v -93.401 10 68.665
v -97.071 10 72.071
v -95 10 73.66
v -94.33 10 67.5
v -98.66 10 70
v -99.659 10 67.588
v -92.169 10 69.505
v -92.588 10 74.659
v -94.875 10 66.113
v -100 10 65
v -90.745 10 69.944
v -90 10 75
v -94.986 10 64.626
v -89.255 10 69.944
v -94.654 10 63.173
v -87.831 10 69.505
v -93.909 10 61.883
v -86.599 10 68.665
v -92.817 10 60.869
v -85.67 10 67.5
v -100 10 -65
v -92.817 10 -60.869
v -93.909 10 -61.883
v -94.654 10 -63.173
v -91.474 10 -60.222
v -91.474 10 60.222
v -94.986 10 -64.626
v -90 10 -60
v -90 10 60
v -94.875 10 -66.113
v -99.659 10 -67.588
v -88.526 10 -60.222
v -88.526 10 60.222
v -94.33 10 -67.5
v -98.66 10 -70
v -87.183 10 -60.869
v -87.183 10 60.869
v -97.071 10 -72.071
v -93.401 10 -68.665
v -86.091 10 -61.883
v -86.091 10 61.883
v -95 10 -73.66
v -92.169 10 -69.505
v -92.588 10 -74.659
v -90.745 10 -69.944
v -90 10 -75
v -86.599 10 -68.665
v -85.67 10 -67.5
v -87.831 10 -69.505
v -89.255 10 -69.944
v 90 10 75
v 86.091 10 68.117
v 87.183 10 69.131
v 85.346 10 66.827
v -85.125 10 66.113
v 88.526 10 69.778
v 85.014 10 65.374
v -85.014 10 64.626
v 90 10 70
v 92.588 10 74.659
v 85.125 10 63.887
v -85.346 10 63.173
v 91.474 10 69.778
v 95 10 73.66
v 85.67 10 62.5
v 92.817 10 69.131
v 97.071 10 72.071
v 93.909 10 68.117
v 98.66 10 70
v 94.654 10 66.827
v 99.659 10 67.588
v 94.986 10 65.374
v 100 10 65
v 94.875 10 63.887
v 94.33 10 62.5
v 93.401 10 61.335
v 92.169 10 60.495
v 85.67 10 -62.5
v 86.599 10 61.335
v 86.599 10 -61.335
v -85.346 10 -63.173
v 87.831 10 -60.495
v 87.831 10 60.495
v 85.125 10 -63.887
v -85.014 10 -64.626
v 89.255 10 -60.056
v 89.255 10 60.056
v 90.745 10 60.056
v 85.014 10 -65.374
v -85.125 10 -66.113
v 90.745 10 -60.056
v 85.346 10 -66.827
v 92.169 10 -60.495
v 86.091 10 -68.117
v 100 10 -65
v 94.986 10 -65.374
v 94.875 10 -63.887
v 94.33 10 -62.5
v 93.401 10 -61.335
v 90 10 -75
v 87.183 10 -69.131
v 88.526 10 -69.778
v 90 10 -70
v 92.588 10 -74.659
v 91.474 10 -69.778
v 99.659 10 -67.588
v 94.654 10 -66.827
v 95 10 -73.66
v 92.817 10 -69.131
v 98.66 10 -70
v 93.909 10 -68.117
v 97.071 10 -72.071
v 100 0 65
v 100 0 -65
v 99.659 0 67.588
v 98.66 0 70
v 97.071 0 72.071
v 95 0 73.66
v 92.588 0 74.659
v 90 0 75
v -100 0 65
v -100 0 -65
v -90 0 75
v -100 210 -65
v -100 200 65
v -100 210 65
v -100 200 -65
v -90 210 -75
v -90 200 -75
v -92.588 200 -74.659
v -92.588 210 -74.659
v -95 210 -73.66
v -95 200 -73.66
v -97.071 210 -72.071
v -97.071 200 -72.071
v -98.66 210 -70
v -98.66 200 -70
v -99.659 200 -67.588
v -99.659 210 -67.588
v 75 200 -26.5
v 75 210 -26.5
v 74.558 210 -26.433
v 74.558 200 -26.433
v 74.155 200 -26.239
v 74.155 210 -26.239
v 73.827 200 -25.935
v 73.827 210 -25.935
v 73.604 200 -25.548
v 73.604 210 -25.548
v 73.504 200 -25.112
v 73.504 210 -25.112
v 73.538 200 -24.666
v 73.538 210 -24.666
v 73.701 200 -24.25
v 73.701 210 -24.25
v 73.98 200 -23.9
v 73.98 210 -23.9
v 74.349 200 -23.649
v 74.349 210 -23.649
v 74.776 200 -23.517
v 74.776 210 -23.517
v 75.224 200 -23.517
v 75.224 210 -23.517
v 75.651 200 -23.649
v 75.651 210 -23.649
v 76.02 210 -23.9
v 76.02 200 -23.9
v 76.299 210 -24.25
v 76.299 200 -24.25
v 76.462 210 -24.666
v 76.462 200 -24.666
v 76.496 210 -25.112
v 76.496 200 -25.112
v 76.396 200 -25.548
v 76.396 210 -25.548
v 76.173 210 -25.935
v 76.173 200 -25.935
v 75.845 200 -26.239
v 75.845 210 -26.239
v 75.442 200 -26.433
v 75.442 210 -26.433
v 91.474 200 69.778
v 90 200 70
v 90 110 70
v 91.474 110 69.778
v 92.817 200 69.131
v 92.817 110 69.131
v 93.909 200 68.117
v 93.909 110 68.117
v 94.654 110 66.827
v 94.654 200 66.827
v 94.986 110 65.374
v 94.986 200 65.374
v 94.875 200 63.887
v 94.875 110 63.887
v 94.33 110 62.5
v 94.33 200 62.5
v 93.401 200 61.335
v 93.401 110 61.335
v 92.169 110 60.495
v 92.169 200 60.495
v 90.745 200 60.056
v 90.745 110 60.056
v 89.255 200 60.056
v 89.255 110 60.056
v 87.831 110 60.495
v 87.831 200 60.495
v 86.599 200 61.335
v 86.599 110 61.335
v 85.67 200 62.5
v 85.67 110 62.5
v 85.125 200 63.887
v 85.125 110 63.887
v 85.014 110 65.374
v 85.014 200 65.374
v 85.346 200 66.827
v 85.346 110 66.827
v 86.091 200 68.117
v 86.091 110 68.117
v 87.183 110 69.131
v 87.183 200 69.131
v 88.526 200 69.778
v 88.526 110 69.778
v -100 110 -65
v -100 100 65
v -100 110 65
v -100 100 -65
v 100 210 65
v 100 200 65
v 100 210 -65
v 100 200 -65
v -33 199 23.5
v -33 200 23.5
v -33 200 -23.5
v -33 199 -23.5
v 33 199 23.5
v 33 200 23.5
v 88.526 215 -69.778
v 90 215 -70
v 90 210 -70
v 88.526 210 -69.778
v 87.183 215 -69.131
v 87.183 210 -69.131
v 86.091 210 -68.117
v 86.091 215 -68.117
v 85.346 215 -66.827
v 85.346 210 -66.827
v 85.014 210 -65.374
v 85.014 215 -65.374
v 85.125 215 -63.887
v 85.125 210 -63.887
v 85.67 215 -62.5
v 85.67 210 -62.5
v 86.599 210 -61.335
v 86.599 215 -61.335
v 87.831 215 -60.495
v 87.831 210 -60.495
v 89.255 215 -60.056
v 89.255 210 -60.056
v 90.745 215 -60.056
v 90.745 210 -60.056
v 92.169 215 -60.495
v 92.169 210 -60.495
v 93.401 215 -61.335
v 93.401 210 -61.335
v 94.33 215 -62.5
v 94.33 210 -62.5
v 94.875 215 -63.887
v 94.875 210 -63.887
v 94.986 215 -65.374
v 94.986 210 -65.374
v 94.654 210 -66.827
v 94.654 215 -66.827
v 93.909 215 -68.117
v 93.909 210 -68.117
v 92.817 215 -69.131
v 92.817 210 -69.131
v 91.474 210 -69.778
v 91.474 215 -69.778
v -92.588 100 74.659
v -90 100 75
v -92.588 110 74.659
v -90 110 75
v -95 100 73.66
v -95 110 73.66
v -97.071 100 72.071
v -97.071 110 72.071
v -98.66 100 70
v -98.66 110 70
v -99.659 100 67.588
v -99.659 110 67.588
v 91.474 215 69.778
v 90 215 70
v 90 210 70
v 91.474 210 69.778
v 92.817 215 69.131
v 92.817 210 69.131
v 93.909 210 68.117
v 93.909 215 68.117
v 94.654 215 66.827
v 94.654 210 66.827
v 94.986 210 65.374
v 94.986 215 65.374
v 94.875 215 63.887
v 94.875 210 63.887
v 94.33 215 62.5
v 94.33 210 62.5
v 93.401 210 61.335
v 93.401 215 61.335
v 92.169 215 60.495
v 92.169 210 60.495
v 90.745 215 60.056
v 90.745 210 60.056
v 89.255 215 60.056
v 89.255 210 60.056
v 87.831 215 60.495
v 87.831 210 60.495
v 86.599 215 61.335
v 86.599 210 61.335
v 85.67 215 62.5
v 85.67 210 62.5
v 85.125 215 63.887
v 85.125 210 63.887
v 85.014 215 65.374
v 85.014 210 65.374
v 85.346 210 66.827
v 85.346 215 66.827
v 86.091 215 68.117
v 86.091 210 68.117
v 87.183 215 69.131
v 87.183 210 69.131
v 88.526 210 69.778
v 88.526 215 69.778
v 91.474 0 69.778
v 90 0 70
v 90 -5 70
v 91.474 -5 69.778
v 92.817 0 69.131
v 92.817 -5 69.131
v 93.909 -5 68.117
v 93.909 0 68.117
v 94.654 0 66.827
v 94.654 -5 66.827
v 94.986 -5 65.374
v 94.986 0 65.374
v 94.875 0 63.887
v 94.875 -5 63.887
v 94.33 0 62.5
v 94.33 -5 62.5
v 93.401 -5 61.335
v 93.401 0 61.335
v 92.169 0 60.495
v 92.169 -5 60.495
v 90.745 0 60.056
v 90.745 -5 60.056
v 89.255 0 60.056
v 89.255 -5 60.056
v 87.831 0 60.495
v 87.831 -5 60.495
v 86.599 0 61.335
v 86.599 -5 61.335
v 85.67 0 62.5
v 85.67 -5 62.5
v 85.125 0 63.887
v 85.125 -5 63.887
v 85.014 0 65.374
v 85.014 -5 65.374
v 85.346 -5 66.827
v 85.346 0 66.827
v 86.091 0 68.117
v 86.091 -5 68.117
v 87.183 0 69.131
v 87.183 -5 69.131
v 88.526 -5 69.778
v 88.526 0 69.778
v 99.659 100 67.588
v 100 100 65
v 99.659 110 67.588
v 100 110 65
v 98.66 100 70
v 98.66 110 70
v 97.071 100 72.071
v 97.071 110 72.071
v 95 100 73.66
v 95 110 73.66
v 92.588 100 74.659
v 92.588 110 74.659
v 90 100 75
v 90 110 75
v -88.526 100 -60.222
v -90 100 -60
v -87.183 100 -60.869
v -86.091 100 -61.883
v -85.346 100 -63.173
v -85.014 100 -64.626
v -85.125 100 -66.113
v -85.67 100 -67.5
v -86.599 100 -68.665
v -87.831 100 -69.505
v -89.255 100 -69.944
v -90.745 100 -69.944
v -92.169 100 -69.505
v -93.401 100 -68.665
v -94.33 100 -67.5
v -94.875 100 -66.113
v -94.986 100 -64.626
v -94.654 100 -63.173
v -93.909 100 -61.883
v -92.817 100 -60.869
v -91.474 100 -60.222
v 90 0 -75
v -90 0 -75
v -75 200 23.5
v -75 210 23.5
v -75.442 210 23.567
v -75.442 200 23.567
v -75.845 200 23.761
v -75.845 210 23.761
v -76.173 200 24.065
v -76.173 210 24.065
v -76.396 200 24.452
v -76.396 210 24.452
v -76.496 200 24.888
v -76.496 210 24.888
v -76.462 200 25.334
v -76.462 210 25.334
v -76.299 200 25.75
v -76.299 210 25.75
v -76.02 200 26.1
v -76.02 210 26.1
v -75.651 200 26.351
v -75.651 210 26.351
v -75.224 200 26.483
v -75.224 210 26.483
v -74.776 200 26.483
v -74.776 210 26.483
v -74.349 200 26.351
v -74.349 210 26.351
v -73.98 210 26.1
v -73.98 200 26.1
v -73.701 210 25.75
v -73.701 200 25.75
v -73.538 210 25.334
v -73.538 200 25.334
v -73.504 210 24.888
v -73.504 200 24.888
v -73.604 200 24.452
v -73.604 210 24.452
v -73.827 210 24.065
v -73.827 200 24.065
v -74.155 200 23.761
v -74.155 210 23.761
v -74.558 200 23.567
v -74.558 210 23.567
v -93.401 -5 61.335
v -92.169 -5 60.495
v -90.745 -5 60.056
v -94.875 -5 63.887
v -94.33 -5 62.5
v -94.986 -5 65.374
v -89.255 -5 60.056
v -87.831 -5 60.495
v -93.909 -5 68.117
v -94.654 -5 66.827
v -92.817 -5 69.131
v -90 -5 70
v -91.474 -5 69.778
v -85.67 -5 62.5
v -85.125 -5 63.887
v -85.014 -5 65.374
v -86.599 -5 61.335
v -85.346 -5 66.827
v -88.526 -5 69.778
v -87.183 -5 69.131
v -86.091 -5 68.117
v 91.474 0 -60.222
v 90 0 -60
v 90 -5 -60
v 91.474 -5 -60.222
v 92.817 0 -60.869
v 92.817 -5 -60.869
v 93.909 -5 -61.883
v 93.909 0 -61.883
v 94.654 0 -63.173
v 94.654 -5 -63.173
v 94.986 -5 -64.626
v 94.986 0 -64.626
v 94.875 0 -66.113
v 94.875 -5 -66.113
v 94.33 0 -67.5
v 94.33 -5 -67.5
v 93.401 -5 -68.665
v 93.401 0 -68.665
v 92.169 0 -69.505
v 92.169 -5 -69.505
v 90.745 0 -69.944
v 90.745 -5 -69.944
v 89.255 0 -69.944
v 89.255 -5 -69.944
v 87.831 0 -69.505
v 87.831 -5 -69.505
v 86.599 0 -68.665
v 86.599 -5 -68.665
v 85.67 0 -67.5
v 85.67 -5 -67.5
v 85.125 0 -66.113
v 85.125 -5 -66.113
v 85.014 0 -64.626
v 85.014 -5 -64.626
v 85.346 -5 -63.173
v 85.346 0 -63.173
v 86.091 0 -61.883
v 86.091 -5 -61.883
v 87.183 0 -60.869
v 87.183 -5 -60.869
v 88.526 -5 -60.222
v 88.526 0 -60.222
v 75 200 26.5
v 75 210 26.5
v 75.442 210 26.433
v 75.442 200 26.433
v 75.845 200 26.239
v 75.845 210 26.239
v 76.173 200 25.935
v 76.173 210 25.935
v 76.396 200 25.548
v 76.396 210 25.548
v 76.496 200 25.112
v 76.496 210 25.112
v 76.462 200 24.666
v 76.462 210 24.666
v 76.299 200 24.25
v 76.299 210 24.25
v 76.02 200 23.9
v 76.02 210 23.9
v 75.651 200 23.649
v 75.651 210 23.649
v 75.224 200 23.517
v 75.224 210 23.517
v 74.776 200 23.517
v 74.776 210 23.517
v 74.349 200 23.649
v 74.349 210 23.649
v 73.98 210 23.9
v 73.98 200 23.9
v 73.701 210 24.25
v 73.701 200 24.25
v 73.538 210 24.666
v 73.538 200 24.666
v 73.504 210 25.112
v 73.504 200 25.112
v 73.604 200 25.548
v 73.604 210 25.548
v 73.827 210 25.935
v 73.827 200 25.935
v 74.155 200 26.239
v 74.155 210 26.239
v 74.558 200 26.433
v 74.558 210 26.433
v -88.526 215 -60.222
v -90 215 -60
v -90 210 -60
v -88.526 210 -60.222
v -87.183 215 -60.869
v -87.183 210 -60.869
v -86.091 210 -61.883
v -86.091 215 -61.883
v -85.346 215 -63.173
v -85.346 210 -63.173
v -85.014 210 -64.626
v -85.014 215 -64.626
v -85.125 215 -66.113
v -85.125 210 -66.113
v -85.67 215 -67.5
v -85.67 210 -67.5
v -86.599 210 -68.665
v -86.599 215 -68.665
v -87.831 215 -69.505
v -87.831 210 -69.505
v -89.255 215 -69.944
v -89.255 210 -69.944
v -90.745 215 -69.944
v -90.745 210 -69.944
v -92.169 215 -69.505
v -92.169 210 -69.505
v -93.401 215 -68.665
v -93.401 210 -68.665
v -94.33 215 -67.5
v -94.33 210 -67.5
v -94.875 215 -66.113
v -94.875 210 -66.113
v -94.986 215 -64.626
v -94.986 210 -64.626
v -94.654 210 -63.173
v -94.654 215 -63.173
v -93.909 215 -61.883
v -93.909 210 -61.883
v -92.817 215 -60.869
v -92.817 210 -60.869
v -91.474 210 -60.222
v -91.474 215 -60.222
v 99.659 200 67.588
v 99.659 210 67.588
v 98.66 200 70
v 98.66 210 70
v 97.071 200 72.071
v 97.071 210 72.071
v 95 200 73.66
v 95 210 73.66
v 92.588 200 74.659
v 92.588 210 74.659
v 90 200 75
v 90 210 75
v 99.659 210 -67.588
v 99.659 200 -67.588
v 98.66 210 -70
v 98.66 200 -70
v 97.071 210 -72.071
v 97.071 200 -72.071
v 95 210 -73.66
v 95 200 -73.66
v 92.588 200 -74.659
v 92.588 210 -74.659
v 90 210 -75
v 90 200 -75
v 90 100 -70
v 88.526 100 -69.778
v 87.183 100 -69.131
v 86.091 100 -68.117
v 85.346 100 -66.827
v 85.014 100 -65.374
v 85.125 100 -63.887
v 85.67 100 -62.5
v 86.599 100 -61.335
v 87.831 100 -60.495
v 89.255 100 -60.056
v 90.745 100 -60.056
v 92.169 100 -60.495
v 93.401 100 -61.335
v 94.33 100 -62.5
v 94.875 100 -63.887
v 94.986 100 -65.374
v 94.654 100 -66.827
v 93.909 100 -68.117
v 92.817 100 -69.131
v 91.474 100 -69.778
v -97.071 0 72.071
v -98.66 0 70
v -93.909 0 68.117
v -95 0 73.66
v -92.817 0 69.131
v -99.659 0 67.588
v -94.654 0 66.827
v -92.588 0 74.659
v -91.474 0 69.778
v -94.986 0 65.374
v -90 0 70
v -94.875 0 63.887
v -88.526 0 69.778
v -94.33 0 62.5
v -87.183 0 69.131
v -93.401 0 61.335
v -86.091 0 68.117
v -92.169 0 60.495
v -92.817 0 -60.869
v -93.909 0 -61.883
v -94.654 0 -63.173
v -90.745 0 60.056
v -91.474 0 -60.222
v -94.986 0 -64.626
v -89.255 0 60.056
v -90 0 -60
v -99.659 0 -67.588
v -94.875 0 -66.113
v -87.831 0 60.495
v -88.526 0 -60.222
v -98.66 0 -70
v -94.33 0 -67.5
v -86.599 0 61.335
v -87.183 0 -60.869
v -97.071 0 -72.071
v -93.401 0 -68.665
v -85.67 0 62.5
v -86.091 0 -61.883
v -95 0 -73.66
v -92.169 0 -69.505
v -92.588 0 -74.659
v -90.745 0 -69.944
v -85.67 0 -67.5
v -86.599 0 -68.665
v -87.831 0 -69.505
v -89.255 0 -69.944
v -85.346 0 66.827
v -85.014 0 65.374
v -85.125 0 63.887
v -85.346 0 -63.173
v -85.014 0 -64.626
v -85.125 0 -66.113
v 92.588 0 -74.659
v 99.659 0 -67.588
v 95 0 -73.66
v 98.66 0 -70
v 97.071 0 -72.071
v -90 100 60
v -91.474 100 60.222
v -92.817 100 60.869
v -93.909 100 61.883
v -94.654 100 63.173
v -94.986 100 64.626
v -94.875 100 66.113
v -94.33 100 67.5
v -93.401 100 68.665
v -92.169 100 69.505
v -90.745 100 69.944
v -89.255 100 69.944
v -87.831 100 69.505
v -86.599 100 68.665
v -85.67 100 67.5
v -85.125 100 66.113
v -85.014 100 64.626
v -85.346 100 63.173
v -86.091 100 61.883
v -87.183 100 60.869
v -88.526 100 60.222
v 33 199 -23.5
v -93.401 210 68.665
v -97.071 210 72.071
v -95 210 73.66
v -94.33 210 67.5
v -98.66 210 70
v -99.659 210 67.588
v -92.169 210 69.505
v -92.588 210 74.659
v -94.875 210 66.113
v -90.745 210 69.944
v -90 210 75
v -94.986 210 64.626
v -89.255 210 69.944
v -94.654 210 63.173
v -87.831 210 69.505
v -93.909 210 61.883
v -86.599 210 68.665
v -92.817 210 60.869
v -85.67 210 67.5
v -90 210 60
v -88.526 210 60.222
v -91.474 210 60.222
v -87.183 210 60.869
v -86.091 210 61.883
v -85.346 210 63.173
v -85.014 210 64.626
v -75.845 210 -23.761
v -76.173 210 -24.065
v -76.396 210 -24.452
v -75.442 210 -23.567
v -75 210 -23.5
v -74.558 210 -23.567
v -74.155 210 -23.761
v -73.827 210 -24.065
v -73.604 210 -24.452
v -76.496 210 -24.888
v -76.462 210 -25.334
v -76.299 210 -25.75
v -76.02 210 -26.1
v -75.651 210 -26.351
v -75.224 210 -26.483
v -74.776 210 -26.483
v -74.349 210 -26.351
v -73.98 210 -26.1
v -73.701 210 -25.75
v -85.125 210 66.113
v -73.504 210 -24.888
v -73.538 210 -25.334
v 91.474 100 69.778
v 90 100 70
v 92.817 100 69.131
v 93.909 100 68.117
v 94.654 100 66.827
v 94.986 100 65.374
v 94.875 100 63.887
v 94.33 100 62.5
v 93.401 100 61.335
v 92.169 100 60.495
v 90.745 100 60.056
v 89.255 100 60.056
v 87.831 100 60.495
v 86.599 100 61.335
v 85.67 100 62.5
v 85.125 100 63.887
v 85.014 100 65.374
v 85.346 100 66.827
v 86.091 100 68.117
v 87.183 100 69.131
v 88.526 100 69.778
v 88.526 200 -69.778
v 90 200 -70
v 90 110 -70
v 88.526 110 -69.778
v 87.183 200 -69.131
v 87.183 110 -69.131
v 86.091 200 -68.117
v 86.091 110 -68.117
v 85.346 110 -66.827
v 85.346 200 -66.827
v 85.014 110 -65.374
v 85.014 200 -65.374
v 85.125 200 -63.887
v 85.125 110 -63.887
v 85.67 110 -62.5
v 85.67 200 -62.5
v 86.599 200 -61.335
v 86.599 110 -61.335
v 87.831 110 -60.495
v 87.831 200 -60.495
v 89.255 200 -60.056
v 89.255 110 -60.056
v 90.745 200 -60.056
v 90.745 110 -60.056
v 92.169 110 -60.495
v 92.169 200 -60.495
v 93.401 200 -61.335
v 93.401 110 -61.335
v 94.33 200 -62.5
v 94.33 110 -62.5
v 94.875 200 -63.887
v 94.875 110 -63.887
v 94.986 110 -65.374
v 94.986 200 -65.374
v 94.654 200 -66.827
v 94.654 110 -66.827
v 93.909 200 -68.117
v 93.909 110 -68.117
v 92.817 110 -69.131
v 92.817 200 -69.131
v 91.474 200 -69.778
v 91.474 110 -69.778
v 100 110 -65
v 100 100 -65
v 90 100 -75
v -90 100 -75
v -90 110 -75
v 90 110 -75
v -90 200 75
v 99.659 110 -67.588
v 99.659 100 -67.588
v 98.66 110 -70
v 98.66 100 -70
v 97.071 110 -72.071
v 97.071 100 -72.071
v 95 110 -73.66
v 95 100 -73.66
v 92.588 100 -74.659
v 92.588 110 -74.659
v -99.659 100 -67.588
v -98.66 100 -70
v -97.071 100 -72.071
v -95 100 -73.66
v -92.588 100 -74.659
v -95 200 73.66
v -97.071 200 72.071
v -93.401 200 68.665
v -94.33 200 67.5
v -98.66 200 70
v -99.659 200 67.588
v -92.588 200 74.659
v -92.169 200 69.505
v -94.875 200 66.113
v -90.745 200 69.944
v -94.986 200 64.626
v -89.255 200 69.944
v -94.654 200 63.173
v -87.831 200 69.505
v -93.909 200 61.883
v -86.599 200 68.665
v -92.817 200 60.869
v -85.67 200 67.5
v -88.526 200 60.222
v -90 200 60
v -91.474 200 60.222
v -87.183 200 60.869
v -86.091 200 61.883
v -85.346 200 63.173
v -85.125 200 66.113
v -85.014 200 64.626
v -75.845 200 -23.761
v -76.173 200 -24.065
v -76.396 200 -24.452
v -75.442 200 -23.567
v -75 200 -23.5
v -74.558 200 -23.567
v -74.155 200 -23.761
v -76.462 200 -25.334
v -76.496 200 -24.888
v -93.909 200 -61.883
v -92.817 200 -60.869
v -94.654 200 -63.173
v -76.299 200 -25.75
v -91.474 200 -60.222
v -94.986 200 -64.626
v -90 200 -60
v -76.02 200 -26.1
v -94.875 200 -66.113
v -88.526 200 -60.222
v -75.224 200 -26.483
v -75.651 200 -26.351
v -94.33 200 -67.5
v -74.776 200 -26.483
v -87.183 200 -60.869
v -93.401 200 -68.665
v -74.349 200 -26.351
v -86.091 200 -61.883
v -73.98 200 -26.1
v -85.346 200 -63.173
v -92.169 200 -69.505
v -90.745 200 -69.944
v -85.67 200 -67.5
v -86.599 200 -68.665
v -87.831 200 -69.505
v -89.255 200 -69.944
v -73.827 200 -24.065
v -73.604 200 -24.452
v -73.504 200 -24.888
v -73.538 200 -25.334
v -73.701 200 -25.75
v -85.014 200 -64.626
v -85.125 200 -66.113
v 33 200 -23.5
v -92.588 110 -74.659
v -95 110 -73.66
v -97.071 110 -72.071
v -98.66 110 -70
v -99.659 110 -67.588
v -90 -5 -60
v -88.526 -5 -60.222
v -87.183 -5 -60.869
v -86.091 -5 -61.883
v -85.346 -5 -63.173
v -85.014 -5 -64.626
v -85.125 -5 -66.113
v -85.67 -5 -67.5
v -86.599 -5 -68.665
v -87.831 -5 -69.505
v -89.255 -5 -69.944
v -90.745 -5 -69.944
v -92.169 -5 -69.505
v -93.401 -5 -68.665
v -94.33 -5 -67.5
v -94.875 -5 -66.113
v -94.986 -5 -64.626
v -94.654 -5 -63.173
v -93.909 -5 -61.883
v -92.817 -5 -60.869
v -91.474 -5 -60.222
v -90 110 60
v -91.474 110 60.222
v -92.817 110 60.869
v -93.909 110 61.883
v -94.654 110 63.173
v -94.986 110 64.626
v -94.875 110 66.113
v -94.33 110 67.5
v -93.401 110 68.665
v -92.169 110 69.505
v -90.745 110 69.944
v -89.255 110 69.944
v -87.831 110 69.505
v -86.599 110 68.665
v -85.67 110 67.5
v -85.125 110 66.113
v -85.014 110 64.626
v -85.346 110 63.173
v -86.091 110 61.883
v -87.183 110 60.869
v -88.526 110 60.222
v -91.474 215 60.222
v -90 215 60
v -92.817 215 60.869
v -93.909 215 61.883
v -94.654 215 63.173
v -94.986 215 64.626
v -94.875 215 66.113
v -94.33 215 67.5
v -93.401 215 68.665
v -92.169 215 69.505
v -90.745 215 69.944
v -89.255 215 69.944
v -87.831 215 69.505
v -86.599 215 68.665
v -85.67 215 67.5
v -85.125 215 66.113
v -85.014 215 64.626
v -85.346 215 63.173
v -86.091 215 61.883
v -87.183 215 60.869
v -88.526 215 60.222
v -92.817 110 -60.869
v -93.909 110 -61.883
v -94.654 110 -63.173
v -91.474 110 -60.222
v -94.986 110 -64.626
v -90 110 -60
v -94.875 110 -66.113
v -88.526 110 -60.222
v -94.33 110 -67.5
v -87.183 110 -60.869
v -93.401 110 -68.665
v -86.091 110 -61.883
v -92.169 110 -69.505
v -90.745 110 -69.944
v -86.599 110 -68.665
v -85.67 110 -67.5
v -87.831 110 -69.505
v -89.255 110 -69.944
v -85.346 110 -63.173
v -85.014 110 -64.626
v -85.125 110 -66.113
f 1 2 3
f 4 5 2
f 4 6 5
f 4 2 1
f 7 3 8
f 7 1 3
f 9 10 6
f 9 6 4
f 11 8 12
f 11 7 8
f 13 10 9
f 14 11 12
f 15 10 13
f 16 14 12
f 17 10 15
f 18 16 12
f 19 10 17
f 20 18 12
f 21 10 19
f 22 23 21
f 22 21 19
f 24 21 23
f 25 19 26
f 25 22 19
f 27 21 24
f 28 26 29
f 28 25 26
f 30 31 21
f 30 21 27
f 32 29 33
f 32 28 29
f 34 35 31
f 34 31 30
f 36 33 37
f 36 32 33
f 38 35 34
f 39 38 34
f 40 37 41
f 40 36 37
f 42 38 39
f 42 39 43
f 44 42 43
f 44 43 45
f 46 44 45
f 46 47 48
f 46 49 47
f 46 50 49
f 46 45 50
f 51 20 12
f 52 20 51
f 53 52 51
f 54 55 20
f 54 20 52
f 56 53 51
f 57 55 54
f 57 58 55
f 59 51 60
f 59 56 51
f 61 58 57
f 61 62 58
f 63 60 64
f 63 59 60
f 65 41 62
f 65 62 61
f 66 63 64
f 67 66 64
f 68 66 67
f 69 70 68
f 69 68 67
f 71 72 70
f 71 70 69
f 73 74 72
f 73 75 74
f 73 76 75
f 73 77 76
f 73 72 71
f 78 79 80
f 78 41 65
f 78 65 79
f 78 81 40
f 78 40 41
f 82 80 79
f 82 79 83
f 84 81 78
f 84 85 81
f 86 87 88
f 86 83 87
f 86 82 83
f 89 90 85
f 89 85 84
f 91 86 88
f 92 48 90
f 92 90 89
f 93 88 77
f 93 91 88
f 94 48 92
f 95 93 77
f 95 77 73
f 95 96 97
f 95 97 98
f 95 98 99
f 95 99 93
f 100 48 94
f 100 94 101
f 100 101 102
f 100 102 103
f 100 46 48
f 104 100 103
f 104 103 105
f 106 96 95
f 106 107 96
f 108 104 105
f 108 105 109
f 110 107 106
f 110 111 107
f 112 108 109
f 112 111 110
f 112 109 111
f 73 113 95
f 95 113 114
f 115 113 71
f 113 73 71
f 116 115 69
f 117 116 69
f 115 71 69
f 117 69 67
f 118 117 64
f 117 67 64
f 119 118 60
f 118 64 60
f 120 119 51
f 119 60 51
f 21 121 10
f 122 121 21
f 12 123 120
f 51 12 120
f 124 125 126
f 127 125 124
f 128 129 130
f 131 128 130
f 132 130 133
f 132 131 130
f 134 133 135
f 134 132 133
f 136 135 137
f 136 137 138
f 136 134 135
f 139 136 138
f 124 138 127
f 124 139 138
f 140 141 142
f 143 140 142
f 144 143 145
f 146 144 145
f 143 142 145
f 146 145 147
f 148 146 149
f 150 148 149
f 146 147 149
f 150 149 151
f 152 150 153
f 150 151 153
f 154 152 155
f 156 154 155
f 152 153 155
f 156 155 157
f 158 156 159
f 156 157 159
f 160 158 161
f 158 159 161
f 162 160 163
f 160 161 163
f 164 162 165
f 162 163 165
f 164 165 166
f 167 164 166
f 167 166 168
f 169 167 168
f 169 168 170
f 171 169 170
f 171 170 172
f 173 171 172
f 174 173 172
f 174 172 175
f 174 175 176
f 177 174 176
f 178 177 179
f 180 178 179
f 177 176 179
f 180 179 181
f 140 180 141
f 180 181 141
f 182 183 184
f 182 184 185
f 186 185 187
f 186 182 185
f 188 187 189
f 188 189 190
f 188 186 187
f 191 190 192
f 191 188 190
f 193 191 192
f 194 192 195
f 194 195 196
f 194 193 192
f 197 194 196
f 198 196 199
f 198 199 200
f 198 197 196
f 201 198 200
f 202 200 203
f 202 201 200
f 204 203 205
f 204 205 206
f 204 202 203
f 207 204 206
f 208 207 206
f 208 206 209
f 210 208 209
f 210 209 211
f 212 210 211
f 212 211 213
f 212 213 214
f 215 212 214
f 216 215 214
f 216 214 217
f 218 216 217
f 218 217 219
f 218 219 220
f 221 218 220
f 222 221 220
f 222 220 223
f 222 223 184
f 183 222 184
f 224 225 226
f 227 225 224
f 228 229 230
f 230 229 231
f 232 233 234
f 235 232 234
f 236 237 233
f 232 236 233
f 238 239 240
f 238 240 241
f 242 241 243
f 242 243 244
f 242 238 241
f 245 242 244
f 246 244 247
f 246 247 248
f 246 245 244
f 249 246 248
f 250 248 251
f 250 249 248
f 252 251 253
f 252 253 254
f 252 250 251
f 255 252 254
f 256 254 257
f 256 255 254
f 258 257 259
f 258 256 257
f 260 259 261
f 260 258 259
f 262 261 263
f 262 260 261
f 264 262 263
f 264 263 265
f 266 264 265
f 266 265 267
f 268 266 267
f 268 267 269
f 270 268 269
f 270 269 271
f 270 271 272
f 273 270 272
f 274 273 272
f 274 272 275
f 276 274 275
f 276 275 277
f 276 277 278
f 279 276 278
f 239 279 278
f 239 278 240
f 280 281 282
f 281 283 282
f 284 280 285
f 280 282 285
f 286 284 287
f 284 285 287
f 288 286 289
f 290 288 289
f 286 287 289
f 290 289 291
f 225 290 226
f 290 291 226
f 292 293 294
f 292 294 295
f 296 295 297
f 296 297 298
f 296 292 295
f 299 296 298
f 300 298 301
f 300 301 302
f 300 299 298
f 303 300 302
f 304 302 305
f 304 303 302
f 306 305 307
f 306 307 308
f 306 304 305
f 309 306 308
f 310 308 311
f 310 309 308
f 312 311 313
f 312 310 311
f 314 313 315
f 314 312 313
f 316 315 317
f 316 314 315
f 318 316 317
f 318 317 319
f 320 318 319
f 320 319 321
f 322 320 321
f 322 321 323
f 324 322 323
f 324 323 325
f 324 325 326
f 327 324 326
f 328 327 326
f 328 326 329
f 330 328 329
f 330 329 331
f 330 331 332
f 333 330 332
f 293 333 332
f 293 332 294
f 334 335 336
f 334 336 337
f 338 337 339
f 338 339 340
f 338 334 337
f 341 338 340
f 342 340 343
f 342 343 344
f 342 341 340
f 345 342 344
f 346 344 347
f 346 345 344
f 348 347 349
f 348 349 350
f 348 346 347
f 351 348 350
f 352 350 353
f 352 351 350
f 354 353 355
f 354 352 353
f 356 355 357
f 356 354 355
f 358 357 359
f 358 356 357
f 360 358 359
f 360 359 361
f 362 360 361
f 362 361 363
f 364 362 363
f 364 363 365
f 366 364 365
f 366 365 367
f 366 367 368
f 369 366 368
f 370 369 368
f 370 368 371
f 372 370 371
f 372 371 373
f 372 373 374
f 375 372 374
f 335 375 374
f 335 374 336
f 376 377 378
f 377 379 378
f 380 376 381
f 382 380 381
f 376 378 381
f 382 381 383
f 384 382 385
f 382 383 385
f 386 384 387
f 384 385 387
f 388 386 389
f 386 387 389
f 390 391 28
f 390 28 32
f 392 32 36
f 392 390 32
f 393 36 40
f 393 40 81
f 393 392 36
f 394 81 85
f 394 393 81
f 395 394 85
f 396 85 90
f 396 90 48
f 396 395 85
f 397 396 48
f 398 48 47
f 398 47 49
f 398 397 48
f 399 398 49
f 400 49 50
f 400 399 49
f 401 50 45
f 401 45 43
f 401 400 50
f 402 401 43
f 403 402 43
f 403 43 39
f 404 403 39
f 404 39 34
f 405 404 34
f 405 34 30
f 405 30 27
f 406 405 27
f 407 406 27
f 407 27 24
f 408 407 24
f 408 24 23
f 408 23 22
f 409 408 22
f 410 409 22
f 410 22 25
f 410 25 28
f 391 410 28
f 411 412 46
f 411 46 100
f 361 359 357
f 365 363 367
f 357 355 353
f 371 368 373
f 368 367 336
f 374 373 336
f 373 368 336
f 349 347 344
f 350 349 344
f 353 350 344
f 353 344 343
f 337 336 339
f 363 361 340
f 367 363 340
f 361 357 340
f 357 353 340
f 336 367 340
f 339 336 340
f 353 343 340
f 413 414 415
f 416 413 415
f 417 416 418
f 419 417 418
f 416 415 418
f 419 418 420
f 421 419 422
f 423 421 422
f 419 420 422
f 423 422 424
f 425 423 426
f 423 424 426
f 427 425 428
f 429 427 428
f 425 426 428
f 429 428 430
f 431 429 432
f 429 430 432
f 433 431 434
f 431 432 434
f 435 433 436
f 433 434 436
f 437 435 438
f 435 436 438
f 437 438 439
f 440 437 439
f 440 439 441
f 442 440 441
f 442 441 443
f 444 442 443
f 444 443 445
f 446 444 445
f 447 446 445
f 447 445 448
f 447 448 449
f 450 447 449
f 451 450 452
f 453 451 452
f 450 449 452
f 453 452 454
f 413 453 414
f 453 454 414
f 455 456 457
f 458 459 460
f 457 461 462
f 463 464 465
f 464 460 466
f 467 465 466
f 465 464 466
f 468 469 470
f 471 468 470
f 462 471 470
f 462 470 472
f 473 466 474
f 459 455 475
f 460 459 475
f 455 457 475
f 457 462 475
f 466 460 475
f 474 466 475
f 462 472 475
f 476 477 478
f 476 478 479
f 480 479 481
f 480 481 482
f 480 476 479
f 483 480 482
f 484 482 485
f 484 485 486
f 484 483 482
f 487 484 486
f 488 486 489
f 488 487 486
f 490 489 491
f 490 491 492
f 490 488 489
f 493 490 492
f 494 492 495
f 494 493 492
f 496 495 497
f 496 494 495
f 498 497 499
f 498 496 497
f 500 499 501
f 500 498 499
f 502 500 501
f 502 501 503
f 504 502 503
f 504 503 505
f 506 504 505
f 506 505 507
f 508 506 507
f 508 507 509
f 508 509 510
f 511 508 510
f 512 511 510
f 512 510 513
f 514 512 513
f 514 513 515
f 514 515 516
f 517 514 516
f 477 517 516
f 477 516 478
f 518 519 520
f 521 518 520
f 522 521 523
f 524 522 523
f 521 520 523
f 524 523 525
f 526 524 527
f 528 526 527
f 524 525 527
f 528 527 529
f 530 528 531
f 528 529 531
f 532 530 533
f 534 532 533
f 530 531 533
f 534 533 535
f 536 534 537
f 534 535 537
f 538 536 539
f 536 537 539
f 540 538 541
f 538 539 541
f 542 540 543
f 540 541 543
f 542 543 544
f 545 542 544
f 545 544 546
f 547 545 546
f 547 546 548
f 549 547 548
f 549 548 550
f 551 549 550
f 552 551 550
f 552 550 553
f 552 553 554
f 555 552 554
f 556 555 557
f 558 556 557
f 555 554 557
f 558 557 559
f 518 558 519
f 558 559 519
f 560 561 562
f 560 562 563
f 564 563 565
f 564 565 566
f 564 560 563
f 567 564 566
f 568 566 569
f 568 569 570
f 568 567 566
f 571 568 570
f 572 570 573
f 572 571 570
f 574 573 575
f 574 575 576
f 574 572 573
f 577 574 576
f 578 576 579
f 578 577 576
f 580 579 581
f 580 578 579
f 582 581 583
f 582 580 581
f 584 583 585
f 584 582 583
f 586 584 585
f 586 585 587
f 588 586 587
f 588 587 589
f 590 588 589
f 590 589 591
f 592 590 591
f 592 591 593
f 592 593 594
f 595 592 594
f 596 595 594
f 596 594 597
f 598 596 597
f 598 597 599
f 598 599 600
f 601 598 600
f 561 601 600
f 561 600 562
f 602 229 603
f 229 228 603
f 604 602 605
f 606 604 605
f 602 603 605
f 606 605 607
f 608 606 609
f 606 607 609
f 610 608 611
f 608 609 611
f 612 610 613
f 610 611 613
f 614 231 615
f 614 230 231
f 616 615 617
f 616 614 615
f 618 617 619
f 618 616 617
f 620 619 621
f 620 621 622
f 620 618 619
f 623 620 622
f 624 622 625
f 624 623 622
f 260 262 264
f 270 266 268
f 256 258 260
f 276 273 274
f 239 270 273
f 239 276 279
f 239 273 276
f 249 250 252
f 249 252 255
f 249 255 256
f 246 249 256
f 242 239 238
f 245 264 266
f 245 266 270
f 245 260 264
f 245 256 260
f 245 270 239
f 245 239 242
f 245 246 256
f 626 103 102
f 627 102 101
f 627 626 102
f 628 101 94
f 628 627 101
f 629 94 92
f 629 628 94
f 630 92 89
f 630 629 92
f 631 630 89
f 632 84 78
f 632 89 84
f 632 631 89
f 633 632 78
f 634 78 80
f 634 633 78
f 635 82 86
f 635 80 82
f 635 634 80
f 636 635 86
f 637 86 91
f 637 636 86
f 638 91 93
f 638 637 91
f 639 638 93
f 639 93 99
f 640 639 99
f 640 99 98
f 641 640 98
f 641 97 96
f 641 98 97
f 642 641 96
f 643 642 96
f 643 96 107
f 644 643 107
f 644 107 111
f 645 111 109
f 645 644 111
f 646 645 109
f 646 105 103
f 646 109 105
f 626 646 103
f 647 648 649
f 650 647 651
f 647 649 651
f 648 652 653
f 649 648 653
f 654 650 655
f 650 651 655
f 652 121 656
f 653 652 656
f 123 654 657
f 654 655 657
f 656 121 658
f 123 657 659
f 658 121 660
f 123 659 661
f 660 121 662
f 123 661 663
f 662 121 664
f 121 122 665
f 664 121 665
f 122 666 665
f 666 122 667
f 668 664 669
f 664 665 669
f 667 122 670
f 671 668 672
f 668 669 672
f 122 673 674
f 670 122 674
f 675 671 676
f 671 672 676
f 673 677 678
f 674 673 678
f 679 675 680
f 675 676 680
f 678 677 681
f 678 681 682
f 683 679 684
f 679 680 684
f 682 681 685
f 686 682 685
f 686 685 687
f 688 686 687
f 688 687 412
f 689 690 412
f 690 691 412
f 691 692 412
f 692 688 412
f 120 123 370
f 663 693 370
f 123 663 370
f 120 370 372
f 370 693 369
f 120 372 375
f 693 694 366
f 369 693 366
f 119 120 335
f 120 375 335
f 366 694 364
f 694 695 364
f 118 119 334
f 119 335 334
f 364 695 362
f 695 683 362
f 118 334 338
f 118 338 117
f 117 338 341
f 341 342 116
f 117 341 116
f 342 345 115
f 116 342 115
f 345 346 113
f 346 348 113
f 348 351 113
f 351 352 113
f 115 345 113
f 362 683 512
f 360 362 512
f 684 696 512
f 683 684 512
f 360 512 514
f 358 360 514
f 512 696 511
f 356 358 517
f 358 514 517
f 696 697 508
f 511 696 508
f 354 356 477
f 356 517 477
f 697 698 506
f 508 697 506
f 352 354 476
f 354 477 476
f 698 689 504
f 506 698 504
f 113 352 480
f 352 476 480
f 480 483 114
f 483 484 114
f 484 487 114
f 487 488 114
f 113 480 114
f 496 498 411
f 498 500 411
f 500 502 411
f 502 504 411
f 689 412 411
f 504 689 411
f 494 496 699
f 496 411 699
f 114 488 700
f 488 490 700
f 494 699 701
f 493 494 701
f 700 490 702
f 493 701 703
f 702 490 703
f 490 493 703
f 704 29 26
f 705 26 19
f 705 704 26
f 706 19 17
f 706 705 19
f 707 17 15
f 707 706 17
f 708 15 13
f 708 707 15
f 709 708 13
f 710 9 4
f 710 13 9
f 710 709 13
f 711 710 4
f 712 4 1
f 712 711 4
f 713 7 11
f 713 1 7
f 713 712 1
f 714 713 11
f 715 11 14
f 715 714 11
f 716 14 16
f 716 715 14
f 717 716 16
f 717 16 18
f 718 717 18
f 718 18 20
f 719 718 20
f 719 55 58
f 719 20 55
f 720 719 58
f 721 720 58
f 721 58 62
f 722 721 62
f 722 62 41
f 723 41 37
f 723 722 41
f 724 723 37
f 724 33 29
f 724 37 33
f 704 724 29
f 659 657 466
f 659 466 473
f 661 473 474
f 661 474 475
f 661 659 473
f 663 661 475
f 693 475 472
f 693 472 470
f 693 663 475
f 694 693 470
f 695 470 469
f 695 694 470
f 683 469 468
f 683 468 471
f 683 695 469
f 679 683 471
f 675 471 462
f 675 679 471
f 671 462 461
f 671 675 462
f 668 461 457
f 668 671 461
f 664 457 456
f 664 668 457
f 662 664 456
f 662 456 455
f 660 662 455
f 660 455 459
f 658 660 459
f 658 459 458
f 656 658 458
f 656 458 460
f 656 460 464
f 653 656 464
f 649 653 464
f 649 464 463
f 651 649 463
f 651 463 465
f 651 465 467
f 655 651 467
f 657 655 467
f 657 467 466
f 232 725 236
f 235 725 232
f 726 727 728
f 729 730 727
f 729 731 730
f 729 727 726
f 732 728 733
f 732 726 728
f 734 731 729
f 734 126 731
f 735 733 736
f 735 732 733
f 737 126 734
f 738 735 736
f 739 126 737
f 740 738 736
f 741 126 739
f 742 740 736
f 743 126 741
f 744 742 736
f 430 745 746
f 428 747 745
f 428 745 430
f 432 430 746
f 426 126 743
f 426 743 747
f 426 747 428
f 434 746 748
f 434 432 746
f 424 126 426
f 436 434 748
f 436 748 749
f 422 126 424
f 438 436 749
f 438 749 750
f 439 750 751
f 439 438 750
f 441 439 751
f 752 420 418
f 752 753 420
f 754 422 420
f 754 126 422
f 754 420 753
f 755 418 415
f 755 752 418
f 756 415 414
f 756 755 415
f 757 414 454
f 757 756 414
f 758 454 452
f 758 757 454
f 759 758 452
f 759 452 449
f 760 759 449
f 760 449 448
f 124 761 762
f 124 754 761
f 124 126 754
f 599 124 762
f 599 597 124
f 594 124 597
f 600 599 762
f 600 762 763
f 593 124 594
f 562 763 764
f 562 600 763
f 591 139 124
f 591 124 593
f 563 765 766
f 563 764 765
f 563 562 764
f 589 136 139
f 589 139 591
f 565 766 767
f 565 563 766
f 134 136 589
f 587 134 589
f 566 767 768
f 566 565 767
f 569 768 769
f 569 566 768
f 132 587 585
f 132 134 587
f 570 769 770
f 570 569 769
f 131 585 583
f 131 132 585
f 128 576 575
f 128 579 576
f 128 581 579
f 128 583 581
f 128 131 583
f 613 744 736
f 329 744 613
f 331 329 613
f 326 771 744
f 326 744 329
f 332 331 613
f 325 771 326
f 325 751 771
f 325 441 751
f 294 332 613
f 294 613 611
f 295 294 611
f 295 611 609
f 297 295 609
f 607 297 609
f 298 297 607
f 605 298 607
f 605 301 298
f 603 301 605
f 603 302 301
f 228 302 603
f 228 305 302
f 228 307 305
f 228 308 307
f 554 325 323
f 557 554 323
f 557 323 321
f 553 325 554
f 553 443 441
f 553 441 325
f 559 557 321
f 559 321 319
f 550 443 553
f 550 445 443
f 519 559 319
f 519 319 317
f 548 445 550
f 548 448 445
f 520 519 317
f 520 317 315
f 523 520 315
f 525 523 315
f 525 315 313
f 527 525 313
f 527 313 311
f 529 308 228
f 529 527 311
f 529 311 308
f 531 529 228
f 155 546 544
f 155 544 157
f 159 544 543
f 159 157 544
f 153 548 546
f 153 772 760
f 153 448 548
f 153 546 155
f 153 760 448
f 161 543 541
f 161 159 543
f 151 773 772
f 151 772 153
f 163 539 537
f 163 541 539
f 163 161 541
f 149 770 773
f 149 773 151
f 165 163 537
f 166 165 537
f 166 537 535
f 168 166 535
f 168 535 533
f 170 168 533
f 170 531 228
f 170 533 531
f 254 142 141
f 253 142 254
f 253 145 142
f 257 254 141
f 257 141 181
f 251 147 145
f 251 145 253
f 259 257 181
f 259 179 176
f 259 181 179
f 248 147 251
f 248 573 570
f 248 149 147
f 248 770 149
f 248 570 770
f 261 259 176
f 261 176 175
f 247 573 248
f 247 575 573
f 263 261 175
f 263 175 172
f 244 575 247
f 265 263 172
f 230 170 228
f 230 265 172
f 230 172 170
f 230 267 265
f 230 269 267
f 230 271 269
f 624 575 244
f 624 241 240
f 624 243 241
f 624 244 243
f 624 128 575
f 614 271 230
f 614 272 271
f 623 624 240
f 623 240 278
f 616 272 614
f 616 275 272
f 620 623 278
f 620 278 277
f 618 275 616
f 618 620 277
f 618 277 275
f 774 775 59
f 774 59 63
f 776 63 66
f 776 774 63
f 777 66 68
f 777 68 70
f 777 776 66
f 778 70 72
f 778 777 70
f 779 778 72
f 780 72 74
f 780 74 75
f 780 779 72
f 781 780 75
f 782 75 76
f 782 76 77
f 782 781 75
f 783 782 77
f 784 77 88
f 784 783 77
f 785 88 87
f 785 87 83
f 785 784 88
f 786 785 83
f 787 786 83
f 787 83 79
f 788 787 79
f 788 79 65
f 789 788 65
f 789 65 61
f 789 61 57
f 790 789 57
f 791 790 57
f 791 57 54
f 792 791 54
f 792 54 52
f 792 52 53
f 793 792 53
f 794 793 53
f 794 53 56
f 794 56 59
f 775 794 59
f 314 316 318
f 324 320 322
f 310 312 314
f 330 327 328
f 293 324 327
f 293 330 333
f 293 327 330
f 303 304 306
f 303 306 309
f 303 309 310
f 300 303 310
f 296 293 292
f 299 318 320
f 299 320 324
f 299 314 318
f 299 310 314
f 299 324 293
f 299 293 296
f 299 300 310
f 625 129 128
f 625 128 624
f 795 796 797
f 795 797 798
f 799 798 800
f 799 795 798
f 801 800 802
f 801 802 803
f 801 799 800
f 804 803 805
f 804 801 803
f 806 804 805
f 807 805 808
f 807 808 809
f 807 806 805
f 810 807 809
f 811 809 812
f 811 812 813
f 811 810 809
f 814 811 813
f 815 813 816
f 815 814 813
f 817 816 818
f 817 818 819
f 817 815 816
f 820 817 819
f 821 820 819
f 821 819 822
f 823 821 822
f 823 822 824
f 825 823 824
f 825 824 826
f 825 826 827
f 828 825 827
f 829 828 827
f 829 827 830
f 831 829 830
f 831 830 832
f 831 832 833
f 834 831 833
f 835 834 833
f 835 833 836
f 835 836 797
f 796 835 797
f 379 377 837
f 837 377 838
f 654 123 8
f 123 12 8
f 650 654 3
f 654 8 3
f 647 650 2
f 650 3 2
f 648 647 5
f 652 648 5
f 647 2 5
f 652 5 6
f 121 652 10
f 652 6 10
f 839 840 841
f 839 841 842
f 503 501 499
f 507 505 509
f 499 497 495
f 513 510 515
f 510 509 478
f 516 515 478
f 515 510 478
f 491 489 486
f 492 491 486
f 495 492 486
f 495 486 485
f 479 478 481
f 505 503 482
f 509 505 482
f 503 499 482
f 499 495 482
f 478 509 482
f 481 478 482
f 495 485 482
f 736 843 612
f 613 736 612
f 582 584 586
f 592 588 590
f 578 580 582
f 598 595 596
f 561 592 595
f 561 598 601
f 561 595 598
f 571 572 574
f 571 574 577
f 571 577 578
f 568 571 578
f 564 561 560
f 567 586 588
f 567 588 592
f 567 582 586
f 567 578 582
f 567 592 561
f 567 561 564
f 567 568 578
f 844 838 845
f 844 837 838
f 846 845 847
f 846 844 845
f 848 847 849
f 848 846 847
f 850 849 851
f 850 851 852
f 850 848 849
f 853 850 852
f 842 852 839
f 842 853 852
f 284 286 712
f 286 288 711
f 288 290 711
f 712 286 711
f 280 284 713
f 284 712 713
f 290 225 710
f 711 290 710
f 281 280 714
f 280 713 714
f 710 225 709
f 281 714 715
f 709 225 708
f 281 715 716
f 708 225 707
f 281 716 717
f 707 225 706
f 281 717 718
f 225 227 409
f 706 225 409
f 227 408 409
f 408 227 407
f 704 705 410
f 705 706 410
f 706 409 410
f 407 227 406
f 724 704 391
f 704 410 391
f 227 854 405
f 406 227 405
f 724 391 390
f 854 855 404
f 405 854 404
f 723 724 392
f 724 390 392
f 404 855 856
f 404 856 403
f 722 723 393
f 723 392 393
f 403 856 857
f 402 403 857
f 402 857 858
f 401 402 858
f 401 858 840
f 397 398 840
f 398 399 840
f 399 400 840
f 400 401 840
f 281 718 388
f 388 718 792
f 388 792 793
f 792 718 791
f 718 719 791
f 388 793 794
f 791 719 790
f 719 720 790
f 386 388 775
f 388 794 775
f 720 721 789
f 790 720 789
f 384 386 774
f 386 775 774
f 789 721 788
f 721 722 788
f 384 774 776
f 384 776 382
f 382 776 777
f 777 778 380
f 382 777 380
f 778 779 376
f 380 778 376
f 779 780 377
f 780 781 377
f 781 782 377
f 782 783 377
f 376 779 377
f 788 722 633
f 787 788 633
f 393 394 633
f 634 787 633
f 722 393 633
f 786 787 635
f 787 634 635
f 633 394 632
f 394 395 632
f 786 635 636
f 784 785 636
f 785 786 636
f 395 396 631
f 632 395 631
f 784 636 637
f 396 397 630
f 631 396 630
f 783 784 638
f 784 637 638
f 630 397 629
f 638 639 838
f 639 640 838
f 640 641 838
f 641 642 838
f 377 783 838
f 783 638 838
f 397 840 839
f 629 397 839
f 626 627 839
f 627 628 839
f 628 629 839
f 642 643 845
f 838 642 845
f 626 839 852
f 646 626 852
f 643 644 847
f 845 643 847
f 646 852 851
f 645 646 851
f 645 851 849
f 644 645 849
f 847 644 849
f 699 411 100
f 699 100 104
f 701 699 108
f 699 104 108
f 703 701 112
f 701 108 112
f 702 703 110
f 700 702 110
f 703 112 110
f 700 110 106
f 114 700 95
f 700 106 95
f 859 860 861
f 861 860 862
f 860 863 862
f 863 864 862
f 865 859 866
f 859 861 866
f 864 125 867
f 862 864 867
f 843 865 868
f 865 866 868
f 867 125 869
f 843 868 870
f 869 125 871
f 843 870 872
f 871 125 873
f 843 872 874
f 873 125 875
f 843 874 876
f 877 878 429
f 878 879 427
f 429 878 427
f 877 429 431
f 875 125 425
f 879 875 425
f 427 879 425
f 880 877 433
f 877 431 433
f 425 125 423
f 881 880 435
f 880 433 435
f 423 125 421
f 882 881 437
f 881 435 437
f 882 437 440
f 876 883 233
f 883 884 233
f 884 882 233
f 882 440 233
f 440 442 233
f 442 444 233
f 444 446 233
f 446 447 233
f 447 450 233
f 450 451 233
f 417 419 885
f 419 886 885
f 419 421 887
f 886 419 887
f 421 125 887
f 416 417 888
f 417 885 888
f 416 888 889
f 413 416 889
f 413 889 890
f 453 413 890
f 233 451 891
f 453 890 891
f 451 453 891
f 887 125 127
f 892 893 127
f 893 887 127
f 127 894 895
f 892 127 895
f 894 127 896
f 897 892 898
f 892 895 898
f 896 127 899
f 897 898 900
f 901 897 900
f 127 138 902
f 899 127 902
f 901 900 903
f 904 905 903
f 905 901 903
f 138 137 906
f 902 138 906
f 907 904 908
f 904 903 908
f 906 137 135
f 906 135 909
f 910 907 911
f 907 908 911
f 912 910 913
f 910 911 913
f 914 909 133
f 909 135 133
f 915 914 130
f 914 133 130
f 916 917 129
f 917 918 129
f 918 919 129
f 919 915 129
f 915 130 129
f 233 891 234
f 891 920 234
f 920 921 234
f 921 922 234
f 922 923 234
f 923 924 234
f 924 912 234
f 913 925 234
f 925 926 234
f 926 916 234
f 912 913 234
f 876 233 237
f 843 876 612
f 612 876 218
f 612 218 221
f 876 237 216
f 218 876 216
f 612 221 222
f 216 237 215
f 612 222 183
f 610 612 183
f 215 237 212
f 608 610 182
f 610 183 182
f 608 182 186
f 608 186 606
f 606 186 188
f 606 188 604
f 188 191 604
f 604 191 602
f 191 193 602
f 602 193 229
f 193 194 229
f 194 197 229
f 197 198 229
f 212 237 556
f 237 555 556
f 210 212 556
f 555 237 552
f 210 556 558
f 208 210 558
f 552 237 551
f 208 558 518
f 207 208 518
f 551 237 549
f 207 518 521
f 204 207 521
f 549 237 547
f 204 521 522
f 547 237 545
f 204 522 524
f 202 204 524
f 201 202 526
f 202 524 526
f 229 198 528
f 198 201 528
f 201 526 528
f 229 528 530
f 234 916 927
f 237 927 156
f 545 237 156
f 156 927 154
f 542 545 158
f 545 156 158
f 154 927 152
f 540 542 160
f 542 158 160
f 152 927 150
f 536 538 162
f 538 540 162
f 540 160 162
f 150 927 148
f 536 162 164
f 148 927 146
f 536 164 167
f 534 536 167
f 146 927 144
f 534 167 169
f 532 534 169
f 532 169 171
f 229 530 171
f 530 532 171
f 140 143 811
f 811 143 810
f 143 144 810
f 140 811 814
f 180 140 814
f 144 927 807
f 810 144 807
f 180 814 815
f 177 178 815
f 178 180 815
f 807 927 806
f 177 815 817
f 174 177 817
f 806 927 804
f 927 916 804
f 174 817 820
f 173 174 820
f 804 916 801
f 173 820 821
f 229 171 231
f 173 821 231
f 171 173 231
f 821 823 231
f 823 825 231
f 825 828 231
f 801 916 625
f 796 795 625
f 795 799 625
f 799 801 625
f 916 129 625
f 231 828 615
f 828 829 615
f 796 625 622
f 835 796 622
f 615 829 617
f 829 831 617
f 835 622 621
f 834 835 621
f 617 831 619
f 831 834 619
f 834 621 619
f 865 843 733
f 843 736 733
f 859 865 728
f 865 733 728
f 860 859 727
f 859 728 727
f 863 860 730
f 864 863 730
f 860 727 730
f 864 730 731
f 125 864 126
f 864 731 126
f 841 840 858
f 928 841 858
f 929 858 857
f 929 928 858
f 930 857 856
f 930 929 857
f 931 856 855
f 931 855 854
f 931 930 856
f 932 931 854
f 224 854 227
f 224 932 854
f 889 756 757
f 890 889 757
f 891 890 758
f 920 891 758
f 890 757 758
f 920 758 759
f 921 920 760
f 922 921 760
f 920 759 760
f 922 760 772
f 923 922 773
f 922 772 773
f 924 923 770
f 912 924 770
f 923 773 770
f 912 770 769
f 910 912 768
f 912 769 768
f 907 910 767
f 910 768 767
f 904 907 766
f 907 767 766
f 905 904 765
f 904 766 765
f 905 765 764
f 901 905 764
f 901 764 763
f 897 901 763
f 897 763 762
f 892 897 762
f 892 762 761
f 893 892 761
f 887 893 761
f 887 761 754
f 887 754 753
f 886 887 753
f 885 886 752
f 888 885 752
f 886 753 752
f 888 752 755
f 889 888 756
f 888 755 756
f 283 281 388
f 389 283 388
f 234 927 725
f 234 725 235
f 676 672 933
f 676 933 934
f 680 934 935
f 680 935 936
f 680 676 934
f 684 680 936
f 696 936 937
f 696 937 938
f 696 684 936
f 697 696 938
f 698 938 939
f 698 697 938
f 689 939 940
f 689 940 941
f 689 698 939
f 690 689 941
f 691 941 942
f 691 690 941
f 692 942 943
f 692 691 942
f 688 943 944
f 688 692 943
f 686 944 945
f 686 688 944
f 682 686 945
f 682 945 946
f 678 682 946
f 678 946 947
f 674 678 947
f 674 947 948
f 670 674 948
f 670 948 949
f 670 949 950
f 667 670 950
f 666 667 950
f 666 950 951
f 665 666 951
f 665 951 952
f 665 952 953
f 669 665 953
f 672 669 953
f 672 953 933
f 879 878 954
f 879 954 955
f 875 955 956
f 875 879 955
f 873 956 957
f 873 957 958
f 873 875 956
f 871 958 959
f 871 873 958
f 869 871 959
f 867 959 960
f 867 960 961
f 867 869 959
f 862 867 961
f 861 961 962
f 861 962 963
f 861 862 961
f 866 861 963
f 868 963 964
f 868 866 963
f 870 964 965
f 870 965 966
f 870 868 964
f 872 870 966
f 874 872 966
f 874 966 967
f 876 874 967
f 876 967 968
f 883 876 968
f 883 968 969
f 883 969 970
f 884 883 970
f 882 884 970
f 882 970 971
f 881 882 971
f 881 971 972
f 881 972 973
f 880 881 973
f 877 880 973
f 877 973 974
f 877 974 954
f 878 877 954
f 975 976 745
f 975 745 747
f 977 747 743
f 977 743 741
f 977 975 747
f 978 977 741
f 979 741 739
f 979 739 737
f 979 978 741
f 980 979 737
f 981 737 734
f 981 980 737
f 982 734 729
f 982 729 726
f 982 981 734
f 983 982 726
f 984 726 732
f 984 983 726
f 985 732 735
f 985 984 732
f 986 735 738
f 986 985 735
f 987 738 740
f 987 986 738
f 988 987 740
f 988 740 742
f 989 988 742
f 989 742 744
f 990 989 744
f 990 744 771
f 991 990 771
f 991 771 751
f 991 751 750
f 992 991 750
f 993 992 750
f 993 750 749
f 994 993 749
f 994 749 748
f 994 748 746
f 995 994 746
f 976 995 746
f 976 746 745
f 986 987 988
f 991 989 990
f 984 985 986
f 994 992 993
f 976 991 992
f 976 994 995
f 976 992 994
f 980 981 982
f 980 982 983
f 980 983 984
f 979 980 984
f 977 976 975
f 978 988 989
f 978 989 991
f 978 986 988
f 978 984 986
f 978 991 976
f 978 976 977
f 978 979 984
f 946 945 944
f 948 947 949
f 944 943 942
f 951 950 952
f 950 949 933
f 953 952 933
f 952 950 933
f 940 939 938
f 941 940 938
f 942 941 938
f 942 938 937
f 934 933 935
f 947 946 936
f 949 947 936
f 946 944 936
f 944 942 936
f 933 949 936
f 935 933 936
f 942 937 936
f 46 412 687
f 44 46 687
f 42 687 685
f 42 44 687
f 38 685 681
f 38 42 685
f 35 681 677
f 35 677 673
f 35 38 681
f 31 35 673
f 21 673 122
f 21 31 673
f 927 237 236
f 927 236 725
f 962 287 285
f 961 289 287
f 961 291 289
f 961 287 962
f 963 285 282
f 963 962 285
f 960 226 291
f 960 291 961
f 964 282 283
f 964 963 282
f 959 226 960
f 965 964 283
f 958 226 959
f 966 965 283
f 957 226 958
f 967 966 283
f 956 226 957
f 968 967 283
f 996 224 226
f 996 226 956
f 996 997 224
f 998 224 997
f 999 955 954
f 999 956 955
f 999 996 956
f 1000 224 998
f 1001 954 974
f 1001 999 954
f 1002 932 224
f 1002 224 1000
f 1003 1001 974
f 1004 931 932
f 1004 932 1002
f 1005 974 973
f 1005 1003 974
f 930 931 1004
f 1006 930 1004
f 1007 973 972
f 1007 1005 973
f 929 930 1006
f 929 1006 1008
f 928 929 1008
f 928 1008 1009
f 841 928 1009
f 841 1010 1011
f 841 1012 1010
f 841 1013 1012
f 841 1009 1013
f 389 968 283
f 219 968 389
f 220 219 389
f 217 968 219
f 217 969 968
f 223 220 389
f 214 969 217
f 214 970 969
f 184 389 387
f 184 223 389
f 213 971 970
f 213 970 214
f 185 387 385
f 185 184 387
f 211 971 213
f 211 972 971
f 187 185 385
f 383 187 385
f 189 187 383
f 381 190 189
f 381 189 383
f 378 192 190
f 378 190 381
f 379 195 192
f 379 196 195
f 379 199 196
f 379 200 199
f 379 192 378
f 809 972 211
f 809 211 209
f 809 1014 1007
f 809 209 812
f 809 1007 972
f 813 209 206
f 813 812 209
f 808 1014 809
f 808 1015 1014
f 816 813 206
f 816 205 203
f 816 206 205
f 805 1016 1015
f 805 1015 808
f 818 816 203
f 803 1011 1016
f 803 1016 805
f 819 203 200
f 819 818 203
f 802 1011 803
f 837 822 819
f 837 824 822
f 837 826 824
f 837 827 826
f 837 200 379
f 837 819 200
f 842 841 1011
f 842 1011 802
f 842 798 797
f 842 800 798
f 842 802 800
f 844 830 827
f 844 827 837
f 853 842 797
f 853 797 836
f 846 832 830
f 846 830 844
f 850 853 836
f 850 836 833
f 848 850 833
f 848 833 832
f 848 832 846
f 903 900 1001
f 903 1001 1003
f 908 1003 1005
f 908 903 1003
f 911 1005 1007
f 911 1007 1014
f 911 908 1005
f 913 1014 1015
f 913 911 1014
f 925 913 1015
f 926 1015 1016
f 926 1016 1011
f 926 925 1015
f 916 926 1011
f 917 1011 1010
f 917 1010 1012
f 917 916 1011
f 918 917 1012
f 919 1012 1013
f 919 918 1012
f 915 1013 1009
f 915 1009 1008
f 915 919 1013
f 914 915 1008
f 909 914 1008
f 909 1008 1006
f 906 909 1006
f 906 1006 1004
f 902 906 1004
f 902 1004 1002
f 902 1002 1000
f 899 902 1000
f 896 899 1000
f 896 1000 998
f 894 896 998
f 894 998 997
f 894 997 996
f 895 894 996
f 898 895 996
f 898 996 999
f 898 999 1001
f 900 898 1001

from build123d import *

# Parameters (mm, degrees)
SKETCH1_W            = 200
SKETCH1_H            = 150
BOSS_EXTRUDE1_DEPTH  = 10
SKETCH2_R            = 5
CUT_EXTRUDE1_DEPTH   = 10
SKETCH3_W            = 200
SKETCH3_H            = 150
SKETCH3_R            = 5
BOSS_EXTRUDE2_DEPTH  = 10
SKETCH4_W            = 200
SKETCH4_H            = 150
SKETCH4_R            = 5
BOSS_EXTRUDE3_DEPTH  = 10
BOSS_EXTRUDE13_START = 205
SKETCH21_R           = 5
BOSS_EXTRUDE13_DEPTH = 205
SKETCH22_R           = 5
BOSS_EXTRUDE14_DEPTH = 15
FILLET2_R            = 10
SKETCH23_R           = 1.5
CUT_EXTRUDE2_DEPTH   = 10
SKETCH30_W           = 66
SKETCH30_H           = 47
BOSS_EXTRUDE16_DEPTH = 1


with BuildPart() as part:
    # Sketch1 → Boss-Extrude1 (new body)
    with BuildSketch(Plane(origin=(0, 0, 0), x_dir=(1, 0, 0), z_dir=(0, 1, 0))):
        Rectangle(SKETCH1_W, SKETCH1_H)
    extrude(amount=BOSS_EXTRUDE1_DEPTH)

    # Sketch2 → Cut-Extrude1 (cut)
    with BuildSketch(Plane(origin=(0, 10, 0), x_dir=(1, 0, 0), z_dir=(0, 1, 0))):
        with Locations(Location((-90, 65, 0), (0, 0, 270))):
            Circle(SKETCH2_R)
        with Locations(Location((90, 65, 0), (0, 0, 90))):
            Circle(SKETCH2_R)
        with Locations(Location((90, -65, 0), (0, 0, 270))):
            Circle(SKETCH2_R)
        with Locations(Location((-90, -65, 0), (0, 0, 90))):
            Circle(SKETCH2_R)
    extrude(amount=-CUT_EXTRUDE1_DEPTH, mode=Mode.SUBTRACT)



with BuildPart() as body_2:
    # Sketch3 → Boss-Extrude2 (new body)
    with BuildSketch(Plane(origin=(0, 100, 0), x_dir=(1, 0, 0), z_dir=(0, 1, 0))):
        Rectangle(SKETCH3_W, SKETCH3_H)
        with Locations(Location((-90, 65, 0), (0, 0, 270))):
            Circle(SKETCH3_R, mode=Mode.SUBTRACT)
        with Locations(Location((90, 65, 0), (0, 0, 90))):
            Circle(SKETCH3_R, mode=Mode.SUBTRACT)
        with Locations(Location((-90, -65, 0), (0, 0, 90))):
            Circle(SKETCH3_R, mode=Mode.SUBTRACT)
        with Locations(Location((90, -65, 0), (0, 0, 270))):
            Circle(SKETCH3_R, mode=Mode.SUBTRACT)
    extrude(amount=BOSS_EXTRUDE2_DEPTH)



with BuildPart() as body_3:
    # Sketch4 → Boss-Extrude3 (new body)
    with BuildSketch(Plane(origin=(0, 200, 0), x_dir=(1, 0, 0), z_dir=(0, 1, 0))):
        Rectangle(SKETCH4_W, SKETCH4_H)
        with Locations(Location((-90, 65, 0), (0, 0, 270))):
            Circle(SKETCH4_R, mode=Mode.SUBTRACT)
        with Locations(Location((90, 65, 0), (0, 0, 90))):
            Circle(SKETCH4_R, mode=Mode.SUBTRACT)
        with Locations(Location((90, -65, 0), (0, 0, 270))):
            Circle(SKETCH4_R, mode=Mode.SUBTRACT)
        with Locations(Location((-90, -65, 0), (0, 0, 90))):
            Circle(SKETCH4_R, mode=Mode.SUBTRACT)
    extrude(amount=BOSS_EXTRUDE3_DEPTH)


with BuildPart() as body_2_1:
    add(body_2.part)

    add(body_3.part)  # Boss-Extrude13 merges body 3
    # Sketch21 → Boss-Extrude13 (add)
    with BuildSketch(Plane(origin=(0, 10, 0), x_dir=(1, 0, 0), z_dir=(0, 1, 0)).offset(BOSS_EXTRUDE13_START)):
        with Locations(Location((-90, -65, 0), (0, 0, 90))):
            Circle(SKETCH21_R)
        with Locations(Location((-90, 65, 0), (0, 0, 270))):
            Circle(SKETCH21_R)
        with Locations(Location((90, 65, 0), (0, 0, 90))):
            Circle(SKETCH21_R)
        with Locations(Location((90, -65, 0), (0, 0, 270))):
            Circle(SKETCH21_R)
    extrude(amount=-BOSS_EXTRUDE13_DEPTH)


with BuildPart() as part_1:
    add(part.part)

    add(body_2_1.part)  # Boss-Extrude14 merges body 2
    # Sketch22 → Boss-Extrude14 (add)
    with BuildSketch(Plane(origin=(0, 10, 0), x_dir=(1, 0, 0), z_dir=(0, 1, 0))):
        with Locations(Location((-90, 65, 0), (0, 0, 270))):
            Circle(SKETCH22_R)
        with Locations(Location((-90, -65, 0), (0, 0, 270))):
            Circle(SKETCH22_R)
        with Locations(Location((90, -65, 0), (0, 0, 270))):
            Circle(SKETCH22_R)
        with Locations(Location((90, 65, 0), (0, 0, 270))):
            Circle(SKETCH22_R)
    extrude(amount=-BOSS_EXTRUDE14_DEPTH)

    # Fillet2
    fillet2_edges = [part_1.edges().sort_by_distance(p)[0] for p in [
        (100, 105, 75),
        (100, 105, -75),
        (-100, 105, -75),
        (-100, 105, 75),
        (100, 205, 75),
        (100, 205, -75),
        (-100, 205, -75),
        (-100, 205, 75),
        (100, 5, 75),
        (-100, 5, 75),
        (-100, 5, -75),
        (100, 5, -75),
    ]]
    fillet(fillet2_edges, radius=FILLET2_R)

    # Sketch23 → Cut-Extrude2 (cut)
    with BuildSketch(Plane(origin=(0, 210, 0), x_dir=(1, 0, 0), z_dir=(0, 1, 0))):
        with Locations(Location((-75, 25, 0), (0, 0, 270))):
            Circle(SKETCH23_R)
        with Locations(Location((-75, -25, 0), (0, 0, 90))):
            Circle(SKETCH23_R)
        with Locations(Location((75, -25, 0), (0, 0, 270))):
            Circle(SKETCH23_R)
        with Locations(Location((75, 25, 0), (0, 0, 90))):
            Circle(SKETCH23_R)
    extrude(amount=-CUT_EXTRUDE2_DEPTH, mode=Mode.SUBTRACT)

    # Sketch30 → Boss-Extrude16 (add)
    with BuildSketch(Plane(origin=(0, 200, 0), x_dir=(-1, 0, 0), z_dir=(0, -1, 0))):
        Rectangle(SKETCH30_W, SKETCH30_H)
    extrude(amount=BOSS_EXTRUDE16_DEPTH)


solid = part_1.part
